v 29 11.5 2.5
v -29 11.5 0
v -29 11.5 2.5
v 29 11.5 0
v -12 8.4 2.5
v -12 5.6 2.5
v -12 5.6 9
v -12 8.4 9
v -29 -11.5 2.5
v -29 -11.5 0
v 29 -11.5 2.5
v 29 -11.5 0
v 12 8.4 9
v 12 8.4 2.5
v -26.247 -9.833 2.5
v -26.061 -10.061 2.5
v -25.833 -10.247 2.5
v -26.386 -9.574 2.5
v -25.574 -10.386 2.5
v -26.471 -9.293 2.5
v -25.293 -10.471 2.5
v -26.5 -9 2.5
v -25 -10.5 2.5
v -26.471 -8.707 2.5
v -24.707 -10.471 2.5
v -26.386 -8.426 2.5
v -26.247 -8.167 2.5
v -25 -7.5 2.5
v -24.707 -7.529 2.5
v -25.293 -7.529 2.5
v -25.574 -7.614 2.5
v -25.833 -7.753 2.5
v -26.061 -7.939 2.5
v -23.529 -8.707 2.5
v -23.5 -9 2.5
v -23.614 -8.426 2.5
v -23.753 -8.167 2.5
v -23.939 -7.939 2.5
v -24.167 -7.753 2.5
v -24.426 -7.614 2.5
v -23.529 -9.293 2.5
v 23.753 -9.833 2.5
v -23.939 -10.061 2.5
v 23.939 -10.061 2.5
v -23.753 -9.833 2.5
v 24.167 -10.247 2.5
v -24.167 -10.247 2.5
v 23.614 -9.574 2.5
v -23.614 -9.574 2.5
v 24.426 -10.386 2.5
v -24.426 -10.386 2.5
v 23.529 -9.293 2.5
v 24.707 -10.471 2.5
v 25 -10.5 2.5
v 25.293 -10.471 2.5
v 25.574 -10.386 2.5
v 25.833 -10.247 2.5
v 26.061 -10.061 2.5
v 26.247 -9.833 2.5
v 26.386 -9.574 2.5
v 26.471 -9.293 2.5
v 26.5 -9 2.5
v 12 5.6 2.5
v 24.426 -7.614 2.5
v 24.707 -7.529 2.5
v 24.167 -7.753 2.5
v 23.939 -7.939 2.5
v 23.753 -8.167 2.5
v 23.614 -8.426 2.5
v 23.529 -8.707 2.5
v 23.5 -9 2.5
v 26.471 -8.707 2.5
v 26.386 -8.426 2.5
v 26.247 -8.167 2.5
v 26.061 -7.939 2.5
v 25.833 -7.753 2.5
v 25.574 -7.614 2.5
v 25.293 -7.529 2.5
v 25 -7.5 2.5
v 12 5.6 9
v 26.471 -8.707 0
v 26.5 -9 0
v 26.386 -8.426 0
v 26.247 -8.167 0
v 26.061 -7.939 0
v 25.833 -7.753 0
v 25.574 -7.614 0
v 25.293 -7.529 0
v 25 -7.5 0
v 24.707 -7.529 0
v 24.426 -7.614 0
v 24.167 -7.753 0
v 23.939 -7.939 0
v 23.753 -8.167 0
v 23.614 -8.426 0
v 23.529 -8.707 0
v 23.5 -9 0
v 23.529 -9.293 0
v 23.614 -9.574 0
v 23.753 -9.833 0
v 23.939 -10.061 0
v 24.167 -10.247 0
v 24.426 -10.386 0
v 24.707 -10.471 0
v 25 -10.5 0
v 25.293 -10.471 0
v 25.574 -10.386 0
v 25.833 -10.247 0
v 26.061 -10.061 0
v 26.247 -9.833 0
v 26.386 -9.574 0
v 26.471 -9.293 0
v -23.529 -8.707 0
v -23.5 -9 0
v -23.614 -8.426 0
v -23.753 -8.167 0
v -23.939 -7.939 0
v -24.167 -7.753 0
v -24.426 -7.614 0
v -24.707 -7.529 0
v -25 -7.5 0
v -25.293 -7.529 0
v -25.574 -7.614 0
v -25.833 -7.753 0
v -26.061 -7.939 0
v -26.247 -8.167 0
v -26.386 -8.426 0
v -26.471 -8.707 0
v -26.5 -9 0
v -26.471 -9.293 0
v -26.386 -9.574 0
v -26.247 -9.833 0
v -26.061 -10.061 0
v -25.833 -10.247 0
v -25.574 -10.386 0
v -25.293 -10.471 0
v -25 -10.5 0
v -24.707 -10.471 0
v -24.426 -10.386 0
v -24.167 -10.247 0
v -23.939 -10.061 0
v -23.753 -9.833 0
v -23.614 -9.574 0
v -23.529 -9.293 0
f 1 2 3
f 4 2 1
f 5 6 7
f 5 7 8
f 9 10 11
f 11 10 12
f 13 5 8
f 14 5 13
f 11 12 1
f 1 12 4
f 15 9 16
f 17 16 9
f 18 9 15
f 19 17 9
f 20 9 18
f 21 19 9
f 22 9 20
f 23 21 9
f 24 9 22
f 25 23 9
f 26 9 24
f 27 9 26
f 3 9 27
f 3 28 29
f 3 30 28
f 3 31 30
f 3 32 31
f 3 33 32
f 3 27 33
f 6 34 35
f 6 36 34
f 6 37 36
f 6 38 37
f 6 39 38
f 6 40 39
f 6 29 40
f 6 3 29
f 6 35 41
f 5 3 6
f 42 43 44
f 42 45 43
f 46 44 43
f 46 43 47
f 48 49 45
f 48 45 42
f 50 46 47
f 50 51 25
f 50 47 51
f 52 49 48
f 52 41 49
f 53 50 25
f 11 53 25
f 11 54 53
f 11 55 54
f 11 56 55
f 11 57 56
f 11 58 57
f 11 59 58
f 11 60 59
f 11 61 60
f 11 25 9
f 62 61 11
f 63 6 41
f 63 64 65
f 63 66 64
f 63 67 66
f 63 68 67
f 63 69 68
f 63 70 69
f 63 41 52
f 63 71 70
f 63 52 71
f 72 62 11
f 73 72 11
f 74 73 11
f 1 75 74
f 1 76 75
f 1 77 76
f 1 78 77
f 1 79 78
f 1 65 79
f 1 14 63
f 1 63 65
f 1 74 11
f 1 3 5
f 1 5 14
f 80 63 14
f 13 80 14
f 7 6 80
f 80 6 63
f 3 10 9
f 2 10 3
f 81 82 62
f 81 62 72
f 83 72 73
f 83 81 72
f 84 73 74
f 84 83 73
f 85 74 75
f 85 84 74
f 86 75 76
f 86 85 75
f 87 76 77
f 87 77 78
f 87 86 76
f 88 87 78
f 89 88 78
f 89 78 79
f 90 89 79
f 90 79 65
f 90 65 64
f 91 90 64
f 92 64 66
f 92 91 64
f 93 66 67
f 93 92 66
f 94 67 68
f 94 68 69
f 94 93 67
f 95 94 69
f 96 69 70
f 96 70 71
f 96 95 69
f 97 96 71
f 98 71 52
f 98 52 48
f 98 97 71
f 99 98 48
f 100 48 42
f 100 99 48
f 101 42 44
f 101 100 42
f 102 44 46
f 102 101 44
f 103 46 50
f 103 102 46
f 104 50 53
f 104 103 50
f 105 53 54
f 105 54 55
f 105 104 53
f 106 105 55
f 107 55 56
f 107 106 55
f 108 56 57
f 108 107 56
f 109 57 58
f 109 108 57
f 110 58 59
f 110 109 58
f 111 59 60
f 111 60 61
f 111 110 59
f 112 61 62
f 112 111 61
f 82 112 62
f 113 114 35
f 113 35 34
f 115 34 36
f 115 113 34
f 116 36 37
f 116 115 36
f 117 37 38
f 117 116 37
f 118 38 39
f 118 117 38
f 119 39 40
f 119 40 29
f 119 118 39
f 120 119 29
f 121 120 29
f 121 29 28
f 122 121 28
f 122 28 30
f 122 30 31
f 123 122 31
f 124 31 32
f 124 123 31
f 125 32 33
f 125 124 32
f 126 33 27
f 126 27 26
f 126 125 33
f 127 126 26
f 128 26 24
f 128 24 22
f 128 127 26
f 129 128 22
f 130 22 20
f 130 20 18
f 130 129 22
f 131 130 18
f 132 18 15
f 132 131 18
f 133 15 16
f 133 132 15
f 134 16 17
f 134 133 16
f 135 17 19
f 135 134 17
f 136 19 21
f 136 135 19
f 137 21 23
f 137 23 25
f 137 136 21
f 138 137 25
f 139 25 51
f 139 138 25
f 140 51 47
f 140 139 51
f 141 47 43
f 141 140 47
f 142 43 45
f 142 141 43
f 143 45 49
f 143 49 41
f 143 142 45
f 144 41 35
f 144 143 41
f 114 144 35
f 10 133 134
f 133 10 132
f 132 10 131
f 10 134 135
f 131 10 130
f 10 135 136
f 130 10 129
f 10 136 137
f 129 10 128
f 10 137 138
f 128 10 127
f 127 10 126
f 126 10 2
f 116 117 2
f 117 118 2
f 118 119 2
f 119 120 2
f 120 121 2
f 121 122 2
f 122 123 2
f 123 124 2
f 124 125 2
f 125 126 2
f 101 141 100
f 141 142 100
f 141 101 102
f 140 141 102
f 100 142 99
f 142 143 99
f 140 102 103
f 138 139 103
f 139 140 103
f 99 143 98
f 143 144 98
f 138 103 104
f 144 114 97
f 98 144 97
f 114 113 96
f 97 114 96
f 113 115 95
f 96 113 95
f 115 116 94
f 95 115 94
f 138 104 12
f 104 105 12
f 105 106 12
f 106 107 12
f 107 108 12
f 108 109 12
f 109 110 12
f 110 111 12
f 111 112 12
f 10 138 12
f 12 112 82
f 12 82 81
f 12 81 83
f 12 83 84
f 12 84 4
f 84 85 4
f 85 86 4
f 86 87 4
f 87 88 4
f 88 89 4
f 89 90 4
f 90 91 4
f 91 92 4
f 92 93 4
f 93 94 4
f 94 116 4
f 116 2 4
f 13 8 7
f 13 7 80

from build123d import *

# Parameters (mm, degrees)
F0_W     = 58
F0_H     = 23
F0_R     = 1.5
F1_DEPTH = 2.5
F2_W     = 24
F2_H     = 2.8
F3_DEPTH = 6.5


with BuildPart() as f1:
    # F0 (on Top) → F1 (new body)
    with BuildSketch(Plane.XY):
        Rectangle(F0_W, F0_H)
        with Locations((-25, -9)):
            Circle(F0_R, mode=Mode.SUBTRACT)
        with Locations((25, -9)):
            Circle(F0_R, mode=Mode.SUBTRACT)
    extrude(amount=F1_DEPTH)

    # F2 (on face) → F3 (join)
    with BuildSketch(Plane.XY.offset(2.5)):
        with Locations((0, 7)):
            Rectangle(F2_W, F2_H)
    extrude(amount=F3_DEPTH)


solid = f1.part
